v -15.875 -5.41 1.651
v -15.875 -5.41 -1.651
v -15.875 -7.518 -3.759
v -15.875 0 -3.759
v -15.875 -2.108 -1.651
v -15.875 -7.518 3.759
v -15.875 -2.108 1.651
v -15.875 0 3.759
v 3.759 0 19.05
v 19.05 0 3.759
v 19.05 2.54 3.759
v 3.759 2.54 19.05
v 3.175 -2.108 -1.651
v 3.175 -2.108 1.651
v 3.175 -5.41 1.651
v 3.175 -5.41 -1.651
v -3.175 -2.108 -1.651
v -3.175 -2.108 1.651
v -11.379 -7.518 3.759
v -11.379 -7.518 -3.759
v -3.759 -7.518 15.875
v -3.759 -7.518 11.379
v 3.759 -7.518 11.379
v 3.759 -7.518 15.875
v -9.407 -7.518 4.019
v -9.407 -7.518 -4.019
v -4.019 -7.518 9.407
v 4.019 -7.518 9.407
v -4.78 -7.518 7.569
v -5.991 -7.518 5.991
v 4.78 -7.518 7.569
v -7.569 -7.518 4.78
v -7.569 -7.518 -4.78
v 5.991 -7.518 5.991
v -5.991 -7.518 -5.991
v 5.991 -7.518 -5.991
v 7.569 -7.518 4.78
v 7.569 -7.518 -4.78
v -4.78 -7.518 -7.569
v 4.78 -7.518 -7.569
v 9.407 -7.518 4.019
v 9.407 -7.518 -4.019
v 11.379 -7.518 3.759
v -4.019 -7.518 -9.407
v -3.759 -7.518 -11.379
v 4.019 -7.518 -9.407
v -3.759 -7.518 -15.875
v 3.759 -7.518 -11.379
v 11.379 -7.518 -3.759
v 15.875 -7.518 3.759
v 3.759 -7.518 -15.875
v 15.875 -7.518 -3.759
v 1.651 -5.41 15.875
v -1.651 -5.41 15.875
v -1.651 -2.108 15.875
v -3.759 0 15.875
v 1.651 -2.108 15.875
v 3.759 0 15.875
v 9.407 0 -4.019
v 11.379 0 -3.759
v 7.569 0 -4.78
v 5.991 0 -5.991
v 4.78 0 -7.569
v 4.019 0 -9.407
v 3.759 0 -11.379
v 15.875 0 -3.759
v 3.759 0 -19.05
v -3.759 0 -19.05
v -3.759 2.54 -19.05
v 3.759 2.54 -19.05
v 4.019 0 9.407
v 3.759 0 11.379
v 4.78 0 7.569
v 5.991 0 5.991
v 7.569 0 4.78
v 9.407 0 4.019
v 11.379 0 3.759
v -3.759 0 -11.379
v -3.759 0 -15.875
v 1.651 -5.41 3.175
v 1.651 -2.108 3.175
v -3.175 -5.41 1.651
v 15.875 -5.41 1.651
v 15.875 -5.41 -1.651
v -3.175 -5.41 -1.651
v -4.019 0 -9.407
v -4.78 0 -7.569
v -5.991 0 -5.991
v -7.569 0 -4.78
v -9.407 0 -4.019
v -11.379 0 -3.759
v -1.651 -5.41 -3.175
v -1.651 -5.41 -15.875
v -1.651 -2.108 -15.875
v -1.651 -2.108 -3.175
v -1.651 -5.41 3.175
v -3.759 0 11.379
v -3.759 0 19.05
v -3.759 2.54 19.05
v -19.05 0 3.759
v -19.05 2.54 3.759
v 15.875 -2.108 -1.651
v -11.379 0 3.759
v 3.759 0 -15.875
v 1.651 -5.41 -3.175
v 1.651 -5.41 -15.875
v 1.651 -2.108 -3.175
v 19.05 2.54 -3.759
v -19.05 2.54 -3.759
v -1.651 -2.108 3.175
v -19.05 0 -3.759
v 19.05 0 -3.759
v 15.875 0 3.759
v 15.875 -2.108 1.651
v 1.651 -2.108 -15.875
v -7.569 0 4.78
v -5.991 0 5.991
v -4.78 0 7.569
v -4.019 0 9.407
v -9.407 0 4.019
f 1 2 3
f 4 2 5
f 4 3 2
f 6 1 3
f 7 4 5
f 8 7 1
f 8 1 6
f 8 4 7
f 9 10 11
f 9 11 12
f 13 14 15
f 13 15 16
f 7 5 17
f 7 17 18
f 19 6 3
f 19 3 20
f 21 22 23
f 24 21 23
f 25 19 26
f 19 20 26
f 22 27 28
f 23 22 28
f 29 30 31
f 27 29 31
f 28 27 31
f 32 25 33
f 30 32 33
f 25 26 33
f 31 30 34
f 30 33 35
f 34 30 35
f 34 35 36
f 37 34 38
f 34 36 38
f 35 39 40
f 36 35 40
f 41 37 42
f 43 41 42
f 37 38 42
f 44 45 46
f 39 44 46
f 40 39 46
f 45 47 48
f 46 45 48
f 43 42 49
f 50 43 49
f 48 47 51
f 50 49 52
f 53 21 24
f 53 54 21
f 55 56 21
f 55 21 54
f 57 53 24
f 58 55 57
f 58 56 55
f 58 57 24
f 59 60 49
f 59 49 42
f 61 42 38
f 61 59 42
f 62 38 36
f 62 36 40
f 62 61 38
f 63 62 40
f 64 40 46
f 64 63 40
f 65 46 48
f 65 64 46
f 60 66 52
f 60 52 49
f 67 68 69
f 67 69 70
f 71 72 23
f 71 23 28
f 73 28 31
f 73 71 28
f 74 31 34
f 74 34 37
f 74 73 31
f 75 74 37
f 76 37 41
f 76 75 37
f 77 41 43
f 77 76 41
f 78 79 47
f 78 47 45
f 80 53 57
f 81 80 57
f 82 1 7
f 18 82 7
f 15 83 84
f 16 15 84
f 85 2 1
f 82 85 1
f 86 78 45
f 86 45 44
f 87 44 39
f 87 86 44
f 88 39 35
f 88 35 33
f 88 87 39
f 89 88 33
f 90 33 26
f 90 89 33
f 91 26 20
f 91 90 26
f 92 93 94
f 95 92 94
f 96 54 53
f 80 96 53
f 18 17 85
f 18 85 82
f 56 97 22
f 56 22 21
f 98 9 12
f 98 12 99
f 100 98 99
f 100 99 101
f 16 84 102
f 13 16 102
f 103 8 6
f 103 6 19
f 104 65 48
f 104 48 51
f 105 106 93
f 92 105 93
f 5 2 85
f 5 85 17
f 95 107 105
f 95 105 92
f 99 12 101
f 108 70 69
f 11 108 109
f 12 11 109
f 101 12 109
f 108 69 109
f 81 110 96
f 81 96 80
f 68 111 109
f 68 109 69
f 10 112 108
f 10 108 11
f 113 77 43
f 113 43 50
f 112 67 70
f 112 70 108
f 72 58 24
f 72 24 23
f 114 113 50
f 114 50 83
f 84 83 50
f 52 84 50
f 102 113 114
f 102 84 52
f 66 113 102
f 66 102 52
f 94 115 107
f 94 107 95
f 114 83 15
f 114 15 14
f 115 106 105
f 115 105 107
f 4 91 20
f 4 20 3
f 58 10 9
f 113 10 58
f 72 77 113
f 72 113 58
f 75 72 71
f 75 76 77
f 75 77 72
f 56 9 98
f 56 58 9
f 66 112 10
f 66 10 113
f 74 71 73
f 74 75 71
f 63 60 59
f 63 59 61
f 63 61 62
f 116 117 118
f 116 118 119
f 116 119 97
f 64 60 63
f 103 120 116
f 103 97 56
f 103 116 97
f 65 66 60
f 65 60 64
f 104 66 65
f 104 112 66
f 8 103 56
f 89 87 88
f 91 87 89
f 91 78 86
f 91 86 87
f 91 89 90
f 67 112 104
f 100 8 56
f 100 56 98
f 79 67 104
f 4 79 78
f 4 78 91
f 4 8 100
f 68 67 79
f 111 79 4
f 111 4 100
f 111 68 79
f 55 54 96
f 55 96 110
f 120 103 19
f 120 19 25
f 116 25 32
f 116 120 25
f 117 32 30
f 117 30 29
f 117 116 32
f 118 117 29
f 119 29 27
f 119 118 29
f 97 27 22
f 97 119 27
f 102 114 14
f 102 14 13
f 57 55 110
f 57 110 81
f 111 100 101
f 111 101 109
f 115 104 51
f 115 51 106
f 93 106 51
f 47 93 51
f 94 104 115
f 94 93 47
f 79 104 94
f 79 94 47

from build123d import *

# Parameters (mm, degrees)
BOSS_EXTRUDE1_DEPTH = 7.5184
SKETCH2_W           = 3.302
SKETCH2_H           = 3.302
CUT_EXTRUDE1_DEPTH  = 12.7
CIRPATTERN1_COUNT   = 4
BOSS_EXTRUDE2_DEPTH = 2.54


with BuildPart() as part:
    # Sketch1 → Boss-Extrude1 (new body)
    with BuildSketch(Plane(origin=(0, 0, 0), x_dir=(1, 0, 0), z_dir=(0, 1, 0))):
        with BuildLine():
            Line((3.7592, 11.3792), (3.7592, 15.875))
            Line((3.7592, 15.875), (-3.7592, 15.875))
            Line((-3.7592, 15.875), (-3.7592, 11.3792))
            ThreePointArc((-3.7592, 11.3792), (-5.991046327, 5.991046327), (-11.3792, 3.7592))
            Line((-11.3792, 3.7592), (-15.875, 3.7592))
            Line((-15.875, 3.7592), (-15.875, -3.7592))
            Line((-15.875, -3.7592), (-11.3792, -3.7592))
            ThreePointArc((-11.3792, -3.7592), (-5.991046327, -5.991046327), (-3.7592, -11.3792))
            Line((-3.7592, -11.3792), (-3.7592, -15.875))
            Line((-3.7592, -15.875), (3.7592, -15.875))
            Line((3.7592, -15.875), (3.7592, -11.3792))
            ThreePointArc((3.7592, -11.3792), (5.991046327, -5.991046327), (11.3792, -3.7592))
            Line((11.3792, -3.7592), (15.875, -3.7592))
            Line((15.875, -3.7592), (15.875, 3.7592))
            Line((15.875, 3.7592), (11.3792, 3.7592))
            ThreePointArc((11.3792, 3.7592), (5.991046327, 5.991046327), (3.7592, 11.3792))
        make_face()
    extrude(amount=-BOSS_EXTRUDE1_DEPTH)

    # Sketch2 → Cut-Extrude1 (cut)
    with BuildSketch(Plane.XY.offset(15.875)):
        with Locations((0, -3.7592)):
            Rectangle(SKETCH2_W, SKETCH2_H)
    cut_extrude1 = extrude(amount=-CUT_EXTRUDE1_DEPTH, mode=Mode.SUBTRACT)

    # CirPattern1: Cut-Extrude1 ×4 about axis
    cirpattern1_axis = Axis((0, -22.390859054, 0), (0, 1, 0))
    for i in range(1, CIRPATTERN1_COUNT):
        add(cut_extrude1.rotate(cirpattern1_axis, i * 360 / CIRPATTERN1_COUNT), mode=Mode.SUBTRACT)

    # Sketch4 → Boss-Extrude2 (add)
    with BuildSketch(Plane(origin=(0, 0, 0), x_dir=(1, 0, 0), z_dir=(0, 1, 0))):
        Polygon((3.7592, 19.05), (19.05, 3.7592), (19.05, -3.7592), (3.7592, -19.05), (-3.7592, -19.05), (-19.05, -3.7592), (-19.05, 3.7592), (-3.7592, 19.05), align=None)
    extrude(amount=BOSS_EXTRUDE2_DEPTH)


solid = part.part
